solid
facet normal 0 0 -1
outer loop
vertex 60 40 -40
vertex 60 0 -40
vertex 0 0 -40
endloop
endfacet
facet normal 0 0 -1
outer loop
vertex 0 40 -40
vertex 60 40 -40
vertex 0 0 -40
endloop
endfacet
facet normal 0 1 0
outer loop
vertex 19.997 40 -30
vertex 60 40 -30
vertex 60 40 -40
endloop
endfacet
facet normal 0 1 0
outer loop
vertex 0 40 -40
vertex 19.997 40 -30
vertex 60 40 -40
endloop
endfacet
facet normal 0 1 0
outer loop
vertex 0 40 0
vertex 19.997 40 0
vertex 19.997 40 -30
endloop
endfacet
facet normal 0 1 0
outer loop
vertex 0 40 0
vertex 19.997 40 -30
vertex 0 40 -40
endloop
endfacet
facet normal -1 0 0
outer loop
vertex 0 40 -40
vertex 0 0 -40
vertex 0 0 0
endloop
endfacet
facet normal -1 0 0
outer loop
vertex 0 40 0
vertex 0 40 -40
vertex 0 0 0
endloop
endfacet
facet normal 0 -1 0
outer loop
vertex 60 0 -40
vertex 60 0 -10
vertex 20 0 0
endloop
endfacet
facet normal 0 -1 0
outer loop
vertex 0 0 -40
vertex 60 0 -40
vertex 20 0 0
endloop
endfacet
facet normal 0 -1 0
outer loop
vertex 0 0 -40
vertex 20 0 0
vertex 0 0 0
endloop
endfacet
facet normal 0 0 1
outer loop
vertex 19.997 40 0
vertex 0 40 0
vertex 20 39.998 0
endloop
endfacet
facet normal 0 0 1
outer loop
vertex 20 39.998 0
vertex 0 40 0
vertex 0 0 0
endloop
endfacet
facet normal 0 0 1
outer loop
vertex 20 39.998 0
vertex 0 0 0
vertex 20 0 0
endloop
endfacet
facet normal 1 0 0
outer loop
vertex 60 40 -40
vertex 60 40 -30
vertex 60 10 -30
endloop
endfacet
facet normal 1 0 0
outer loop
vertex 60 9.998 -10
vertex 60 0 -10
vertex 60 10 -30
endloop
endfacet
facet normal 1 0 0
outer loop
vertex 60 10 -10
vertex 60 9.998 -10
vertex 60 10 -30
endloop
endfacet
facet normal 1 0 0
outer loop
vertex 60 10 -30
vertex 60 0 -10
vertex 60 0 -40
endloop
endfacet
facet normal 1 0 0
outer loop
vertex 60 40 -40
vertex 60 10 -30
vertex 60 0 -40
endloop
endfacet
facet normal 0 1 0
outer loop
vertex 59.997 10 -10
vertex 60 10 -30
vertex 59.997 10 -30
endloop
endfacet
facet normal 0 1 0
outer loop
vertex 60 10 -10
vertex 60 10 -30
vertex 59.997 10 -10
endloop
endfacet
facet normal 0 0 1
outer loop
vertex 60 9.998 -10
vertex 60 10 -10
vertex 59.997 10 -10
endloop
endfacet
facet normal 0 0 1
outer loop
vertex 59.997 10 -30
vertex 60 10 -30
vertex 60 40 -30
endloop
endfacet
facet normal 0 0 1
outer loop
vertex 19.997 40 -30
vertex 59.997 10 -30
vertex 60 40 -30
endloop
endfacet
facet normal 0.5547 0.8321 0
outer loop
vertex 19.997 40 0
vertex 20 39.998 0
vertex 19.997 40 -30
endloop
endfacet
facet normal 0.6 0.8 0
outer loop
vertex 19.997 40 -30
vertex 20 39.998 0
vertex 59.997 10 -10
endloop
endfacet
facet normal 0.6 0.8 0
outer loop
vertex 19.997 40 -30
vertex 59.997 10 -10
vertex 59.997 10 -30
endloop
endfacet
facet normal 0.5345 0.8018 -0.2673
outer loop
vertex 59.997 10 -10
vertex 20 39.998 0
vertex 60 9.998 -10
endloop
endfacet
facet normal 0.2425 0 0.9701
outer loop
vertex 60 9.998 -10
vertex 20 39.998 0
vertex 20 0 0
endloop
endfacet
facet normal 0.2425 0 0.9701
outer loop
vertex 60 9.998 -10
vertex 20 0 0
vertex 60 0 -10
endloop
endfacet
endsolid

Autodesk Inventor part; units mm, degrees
ref_plane "YZ Plane" through (0, 0, 0) normal (1, 0, 0) x (0, 1, 0)
ref_plane "XZ Plane" through (0, 0, 0) normal (0, 1, 0) x (-1, 0, 0)
sketch "草圖1" plane through (0, 0, 0) normal (0, 1, 0) x (-1, 0, 0)
  line L0 (0, 0) -> (-60, 0)
  line L1 (-60, 0) -> (-60, -40)
  line L2 (-60, -40) -> (0, -40)
  line L3 (0, -40) -> (0, 0)
  dimension "d0" = 60
  dimension "d1" = 40
extrude "擠出1" add sketch "草圖1" along normal blind 40
sketch "草圖2" plane through (0, 40, 0) normal (0, 1, 0) x (1, 0, 0)
  line L0 (60, 0) -> (60, 40) projected
  line L1 (60, 0) -> (60, 10)
  line L2 (0, 0) -> (60, 0) projected
  line L3 (20, 0) -> (60, 0)
  line L4 (20, 0) -> (60, 10)
  dimension "d5" = 20
extrude "擠出2" cut sketch "草圖2" against normal blind 40
sketch "草圖3" plane through (0, 40, 0) normal (0, 1, 0) x (1, 0, 0)
  line L0 (60, 40) -> (0, 40) projected
  line L1 (0, 40) -> (0, 0) projected
  line L2 (0, 0) -> (20, 0) projected
  point P0 (20, 30)
  dimension "d8" = 10
  dimension "d9" = 20
  dimension "d10" = 20
  dimension "d11" = 0
sketch "草圖4" plane through (60, 0, -40) normal (1, 0, 0) x (0, 0, -1)
  line L0 (-30, 40) -> (-30, 0) projected
  line L1 (-30, 0) -> (0, 0) projected
  point P0 (-40, 0)
  point P1 (-30, 10)
  dimension "d12" = 10
ref_plane "工作平面1" through (20, 40, 0) normal (-0.6, -0.8, 0) x (0, 0, -1)
sketch "草圖5" plane through (20, 40, 0) normal (-0.6, -0.8, 0) x (0, 0, -1)
  line L0 (-51.3035, -32.4862) -> (51.6467, -32.4862)
  line L1 (51.6467, -32.4862) -> (51.6467, 68.0272)
  line L2 (51.6467, 68.0272) -> (-51.3035, 68.0272)
  line L3 (-51.3035, 68.0272) -> (-51.3035, -32.4862)
  point P0 (0, 8)
extrude "擠出3" cut sketch "草圖5" against normal blind 40
sketch "草圖6" plane through (60, 0, -10) normal (1, 0, 0) x (0, 0, -1)
  line L0 (30, 0) -> (30, 40) projected
  line L1 (0, 0) -> (30, 0)
  line L2 (30, 0) -> (30, 10)
  line L3 (30, 10) -> (0, 10)
  line L4 (0, 10) -> (0, 0)
  line L5 (30, 0) -> (20, 0)
  line L6 (20, 0) -> (20, 40)
  line L7 (20, 40) -> (30, 40)
  line L8 (30, 40) -> (30, 0)
  line L9 (0, 0) -> (30, 0) projected
  line L10 (-10, 0) -> (-10, 40) projected
  dimension "d15" = 10
  dimension "d16" = 10
  dimension "d17" = 0
  dimension "d18" = 10
extrude "擠出4" add sketch "草圖6" against normal up to next
properties part number "50 (74000.000 mm^3)"
